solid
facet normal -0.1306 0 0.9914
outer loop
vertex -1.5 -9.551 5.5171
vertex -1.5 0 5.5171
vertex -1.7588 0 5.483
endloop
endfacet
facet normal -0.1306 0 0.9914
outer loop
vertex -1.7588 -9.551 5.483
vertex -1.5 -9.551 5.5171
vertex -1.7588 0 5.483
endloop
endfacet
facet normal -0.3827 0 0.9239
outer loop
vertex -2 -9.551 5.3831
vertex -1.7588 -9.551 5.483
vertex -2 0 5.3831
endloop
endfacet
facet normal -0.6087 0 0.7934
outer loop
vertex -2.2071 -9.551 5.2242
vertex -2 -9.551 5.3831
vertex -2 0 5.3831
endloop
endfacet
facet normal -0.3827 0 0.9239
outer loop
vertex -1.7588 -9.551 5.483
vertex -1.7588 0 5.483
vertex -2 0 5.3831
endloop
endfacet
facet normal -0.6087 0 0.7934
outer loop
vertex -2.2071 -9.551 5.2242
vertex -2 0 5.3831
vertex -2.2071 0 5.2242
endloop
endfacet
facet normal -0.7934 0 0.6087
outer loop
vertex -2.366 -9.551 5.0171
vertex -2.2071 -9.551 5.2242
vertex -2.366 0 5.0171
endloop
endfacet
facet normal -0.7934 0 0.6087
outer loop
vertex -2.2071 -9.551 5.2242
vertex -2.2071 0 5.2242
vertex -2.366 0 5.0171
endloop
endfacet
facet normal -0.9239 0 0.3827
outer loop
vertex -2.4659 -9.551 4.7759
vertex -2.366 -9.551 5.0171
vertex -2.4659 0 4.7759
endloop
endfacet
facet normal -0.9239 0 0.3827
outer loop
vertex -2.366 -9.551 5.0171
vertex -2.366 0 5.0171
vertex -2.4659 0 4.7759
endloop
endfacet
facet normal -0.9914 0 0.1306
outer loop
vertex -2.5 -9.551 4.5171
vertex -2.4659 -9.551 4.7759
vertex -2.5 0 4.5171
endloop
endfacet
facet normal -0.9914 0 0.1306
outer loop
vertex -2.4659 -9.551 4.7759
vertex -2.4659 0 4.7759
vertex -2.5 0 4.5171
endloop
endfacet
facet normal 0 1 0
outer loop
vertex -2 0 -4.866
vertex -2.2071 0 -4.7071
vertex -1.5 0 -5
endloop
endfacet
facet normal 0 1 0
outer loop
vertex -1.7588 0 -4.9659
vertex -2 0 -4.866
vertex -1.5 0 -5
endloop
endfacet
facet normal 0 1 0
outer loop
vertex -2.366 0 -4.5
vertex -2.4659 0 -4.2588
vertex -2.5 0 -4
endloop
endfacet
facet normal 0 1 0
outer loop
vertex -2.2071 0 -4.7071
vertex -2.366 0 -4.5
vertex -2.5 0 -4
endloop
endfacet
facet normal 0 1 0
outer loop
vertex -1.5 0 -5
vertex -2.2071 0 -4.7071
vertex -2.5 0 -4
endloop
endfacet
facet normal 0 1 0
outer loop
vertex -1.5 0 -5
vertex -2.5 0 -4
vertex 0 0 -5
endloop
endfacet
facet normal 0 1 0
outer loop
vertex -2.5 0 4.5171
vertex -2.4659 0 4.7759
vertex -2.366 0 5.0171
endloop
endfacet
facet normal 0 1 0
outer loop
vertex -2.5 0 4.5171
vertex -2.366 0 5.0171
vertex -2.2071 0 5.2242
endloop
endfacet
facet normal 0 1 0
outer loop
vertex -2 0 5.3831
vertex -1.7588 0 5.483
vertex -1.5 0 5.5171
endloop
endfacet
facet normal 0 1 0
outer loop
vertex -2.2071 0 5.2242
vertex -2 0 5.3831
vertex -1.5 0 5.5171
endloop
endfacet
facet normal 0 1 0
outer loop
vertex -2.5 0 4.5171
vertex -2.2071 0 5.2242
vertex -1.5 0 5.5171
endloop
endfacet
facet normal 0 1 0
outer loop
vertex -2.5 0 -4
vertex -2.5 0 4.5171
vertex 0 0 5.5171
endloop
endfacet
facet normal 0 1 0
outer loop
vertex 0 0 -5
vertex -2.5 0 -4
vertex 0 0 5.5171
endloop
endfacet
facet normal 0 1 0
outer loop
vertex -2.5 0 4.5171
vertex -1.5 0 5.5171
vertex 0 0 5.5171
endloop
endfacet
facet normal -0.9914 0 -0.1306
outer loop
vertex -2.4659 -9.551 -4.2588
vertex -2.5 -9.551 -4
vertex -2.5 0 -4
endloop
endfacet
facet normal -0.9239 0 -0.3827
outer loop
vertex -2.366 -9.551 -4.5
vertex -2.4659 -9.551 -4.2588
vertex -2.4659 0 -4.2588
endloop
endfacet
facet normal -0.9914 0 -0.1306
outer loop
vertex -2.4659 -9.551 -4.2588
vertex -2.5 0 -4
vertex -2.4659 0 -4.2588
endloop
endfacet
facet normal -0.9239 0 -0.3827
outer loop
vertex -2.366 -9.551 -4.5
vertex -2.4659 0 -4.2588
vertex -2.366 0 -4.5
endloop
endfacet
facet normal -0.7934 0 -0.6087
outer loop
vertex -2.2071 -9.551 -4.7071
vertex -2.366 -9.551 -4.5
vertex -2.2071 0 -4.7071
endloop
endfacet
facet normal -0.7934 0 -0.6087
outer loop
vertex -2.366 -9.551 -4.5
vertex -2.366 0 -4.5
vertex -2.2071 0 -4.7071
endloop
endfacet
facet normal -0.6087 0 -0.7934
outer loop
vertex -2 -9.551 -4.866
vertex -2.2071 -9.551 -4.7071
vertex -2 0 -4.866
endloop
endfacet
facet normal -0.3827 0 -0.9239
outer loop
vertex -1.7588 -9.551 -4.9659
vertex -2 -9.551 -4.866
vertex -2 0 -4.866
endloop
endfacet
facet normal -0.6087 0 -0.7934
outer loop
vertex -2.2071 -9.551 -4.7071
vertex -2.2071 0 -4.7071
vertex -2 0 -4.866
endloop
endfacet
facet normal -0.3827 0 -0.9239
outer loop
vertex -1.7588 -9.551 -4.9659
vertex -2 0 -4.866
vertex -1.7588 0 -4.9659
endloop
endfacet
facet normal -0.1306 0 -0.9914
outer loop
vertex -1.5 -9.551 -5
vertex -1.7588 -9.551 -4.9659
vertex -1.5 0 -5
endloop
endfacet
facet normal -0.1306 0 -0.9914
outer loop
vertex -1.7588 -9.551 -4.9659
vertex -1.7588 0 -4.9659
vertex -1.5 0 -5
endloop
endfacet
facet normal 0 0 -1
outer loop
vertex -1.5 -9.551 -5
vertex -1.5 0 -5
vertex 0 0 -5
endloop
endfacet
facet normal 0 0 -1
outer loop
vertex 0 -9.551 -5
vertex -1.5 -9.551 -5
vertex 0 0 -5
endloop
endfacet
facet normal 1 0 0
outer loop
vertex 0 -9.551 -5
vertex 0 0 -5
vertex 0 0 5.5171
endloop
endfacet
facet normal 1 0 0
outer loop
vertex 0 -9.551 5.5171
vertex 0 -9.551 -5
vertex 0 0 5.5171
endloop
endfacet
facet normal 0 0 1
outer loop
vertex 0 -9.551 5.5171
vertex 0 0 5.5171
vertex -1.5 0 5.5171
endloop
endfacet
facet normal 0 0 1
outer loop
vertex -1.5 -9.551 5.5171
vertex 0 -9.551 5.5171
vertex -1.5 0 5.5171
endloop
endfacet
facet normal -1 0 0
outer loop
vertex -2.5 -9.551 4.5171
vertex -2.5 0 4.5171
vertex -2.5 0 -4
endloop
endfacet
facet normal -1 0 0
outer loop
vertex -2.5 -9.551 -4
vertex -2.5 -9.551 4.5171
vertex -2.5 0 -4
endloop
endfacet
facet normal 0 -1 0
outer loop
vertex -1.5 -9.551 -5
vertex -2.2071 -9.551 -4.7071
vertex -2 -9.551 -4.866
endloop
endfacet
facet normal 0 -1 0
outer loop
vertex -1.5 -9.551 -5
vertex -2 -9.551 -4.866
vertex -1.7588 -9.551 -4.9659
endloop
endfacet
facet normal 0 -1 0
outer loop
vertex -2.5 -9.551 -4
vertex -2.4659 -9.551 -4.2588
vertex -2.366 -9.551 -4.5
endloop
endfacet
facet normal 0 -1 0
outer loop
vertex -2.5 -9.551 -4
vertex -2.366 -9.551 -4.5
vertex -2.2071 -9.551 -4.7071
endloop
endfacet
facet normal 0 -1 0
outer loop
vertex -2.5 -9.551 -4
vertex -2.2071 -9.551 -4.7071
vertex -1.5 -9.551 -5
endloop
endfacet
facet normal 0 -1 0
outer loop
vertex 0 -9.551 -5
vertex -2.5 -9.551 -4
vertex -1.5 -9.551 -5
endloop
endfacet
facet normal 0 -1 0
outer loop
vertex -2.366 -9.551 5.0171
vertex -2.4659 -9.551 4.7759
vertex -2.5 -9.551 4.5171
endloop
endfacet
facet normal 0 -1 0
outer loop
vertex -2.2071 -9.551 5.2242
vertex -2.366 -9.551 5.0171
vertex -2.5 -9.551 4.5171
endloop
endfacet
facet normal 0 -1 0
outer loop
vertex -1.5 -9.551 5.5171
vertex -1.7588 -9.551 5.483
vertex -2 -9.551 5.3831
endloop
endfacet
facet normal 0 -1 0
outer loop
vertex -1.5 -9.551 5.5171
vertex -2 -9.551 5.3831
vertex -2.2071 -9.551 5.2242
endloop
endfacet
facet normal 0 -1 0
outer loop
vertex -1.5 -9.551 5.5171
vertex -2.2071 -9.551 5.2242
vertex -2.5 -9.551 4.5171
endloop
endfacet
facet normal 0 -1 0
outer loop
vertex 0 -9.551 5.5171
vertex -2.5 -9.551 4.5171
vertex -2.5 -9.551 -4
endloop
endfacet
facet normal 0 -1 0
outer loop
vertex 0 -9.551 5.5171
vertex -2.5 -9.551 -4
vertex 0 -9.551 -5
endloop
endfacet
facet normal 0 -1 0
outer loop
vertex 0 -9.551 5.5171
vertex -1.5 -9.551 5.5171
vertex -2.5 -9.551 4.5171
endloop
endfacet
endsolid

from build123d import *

# Parameters (mm, degrees)
F1_DEPTH = 9.551


with BuildPart() as f1:
    # F0 (on Front) → F1 (new body)
    with BuildSketch(Plane.XZ):
        with BuildLine():
            Line((0, -5), (0, 0))
            Line((0, 0), (0, 5.517102))
            Line((0, 5.517102), (-1.5, 5.517102))
            ThreePointArc((-1.5, 5.517102), (-2.207107, 5.224208), (-2.5, 4.517102))
            Line((-2.5, 4.517102), (-2.5, -4))
            ThreePointArc((-2.5, -4), (-2.207107, -4.707107), (-1.5, -5))
            Line((-1.5, -5), (0, -5))
        make_face()
    extrude(amount=F1_DEPTH)


solid = f1.part
